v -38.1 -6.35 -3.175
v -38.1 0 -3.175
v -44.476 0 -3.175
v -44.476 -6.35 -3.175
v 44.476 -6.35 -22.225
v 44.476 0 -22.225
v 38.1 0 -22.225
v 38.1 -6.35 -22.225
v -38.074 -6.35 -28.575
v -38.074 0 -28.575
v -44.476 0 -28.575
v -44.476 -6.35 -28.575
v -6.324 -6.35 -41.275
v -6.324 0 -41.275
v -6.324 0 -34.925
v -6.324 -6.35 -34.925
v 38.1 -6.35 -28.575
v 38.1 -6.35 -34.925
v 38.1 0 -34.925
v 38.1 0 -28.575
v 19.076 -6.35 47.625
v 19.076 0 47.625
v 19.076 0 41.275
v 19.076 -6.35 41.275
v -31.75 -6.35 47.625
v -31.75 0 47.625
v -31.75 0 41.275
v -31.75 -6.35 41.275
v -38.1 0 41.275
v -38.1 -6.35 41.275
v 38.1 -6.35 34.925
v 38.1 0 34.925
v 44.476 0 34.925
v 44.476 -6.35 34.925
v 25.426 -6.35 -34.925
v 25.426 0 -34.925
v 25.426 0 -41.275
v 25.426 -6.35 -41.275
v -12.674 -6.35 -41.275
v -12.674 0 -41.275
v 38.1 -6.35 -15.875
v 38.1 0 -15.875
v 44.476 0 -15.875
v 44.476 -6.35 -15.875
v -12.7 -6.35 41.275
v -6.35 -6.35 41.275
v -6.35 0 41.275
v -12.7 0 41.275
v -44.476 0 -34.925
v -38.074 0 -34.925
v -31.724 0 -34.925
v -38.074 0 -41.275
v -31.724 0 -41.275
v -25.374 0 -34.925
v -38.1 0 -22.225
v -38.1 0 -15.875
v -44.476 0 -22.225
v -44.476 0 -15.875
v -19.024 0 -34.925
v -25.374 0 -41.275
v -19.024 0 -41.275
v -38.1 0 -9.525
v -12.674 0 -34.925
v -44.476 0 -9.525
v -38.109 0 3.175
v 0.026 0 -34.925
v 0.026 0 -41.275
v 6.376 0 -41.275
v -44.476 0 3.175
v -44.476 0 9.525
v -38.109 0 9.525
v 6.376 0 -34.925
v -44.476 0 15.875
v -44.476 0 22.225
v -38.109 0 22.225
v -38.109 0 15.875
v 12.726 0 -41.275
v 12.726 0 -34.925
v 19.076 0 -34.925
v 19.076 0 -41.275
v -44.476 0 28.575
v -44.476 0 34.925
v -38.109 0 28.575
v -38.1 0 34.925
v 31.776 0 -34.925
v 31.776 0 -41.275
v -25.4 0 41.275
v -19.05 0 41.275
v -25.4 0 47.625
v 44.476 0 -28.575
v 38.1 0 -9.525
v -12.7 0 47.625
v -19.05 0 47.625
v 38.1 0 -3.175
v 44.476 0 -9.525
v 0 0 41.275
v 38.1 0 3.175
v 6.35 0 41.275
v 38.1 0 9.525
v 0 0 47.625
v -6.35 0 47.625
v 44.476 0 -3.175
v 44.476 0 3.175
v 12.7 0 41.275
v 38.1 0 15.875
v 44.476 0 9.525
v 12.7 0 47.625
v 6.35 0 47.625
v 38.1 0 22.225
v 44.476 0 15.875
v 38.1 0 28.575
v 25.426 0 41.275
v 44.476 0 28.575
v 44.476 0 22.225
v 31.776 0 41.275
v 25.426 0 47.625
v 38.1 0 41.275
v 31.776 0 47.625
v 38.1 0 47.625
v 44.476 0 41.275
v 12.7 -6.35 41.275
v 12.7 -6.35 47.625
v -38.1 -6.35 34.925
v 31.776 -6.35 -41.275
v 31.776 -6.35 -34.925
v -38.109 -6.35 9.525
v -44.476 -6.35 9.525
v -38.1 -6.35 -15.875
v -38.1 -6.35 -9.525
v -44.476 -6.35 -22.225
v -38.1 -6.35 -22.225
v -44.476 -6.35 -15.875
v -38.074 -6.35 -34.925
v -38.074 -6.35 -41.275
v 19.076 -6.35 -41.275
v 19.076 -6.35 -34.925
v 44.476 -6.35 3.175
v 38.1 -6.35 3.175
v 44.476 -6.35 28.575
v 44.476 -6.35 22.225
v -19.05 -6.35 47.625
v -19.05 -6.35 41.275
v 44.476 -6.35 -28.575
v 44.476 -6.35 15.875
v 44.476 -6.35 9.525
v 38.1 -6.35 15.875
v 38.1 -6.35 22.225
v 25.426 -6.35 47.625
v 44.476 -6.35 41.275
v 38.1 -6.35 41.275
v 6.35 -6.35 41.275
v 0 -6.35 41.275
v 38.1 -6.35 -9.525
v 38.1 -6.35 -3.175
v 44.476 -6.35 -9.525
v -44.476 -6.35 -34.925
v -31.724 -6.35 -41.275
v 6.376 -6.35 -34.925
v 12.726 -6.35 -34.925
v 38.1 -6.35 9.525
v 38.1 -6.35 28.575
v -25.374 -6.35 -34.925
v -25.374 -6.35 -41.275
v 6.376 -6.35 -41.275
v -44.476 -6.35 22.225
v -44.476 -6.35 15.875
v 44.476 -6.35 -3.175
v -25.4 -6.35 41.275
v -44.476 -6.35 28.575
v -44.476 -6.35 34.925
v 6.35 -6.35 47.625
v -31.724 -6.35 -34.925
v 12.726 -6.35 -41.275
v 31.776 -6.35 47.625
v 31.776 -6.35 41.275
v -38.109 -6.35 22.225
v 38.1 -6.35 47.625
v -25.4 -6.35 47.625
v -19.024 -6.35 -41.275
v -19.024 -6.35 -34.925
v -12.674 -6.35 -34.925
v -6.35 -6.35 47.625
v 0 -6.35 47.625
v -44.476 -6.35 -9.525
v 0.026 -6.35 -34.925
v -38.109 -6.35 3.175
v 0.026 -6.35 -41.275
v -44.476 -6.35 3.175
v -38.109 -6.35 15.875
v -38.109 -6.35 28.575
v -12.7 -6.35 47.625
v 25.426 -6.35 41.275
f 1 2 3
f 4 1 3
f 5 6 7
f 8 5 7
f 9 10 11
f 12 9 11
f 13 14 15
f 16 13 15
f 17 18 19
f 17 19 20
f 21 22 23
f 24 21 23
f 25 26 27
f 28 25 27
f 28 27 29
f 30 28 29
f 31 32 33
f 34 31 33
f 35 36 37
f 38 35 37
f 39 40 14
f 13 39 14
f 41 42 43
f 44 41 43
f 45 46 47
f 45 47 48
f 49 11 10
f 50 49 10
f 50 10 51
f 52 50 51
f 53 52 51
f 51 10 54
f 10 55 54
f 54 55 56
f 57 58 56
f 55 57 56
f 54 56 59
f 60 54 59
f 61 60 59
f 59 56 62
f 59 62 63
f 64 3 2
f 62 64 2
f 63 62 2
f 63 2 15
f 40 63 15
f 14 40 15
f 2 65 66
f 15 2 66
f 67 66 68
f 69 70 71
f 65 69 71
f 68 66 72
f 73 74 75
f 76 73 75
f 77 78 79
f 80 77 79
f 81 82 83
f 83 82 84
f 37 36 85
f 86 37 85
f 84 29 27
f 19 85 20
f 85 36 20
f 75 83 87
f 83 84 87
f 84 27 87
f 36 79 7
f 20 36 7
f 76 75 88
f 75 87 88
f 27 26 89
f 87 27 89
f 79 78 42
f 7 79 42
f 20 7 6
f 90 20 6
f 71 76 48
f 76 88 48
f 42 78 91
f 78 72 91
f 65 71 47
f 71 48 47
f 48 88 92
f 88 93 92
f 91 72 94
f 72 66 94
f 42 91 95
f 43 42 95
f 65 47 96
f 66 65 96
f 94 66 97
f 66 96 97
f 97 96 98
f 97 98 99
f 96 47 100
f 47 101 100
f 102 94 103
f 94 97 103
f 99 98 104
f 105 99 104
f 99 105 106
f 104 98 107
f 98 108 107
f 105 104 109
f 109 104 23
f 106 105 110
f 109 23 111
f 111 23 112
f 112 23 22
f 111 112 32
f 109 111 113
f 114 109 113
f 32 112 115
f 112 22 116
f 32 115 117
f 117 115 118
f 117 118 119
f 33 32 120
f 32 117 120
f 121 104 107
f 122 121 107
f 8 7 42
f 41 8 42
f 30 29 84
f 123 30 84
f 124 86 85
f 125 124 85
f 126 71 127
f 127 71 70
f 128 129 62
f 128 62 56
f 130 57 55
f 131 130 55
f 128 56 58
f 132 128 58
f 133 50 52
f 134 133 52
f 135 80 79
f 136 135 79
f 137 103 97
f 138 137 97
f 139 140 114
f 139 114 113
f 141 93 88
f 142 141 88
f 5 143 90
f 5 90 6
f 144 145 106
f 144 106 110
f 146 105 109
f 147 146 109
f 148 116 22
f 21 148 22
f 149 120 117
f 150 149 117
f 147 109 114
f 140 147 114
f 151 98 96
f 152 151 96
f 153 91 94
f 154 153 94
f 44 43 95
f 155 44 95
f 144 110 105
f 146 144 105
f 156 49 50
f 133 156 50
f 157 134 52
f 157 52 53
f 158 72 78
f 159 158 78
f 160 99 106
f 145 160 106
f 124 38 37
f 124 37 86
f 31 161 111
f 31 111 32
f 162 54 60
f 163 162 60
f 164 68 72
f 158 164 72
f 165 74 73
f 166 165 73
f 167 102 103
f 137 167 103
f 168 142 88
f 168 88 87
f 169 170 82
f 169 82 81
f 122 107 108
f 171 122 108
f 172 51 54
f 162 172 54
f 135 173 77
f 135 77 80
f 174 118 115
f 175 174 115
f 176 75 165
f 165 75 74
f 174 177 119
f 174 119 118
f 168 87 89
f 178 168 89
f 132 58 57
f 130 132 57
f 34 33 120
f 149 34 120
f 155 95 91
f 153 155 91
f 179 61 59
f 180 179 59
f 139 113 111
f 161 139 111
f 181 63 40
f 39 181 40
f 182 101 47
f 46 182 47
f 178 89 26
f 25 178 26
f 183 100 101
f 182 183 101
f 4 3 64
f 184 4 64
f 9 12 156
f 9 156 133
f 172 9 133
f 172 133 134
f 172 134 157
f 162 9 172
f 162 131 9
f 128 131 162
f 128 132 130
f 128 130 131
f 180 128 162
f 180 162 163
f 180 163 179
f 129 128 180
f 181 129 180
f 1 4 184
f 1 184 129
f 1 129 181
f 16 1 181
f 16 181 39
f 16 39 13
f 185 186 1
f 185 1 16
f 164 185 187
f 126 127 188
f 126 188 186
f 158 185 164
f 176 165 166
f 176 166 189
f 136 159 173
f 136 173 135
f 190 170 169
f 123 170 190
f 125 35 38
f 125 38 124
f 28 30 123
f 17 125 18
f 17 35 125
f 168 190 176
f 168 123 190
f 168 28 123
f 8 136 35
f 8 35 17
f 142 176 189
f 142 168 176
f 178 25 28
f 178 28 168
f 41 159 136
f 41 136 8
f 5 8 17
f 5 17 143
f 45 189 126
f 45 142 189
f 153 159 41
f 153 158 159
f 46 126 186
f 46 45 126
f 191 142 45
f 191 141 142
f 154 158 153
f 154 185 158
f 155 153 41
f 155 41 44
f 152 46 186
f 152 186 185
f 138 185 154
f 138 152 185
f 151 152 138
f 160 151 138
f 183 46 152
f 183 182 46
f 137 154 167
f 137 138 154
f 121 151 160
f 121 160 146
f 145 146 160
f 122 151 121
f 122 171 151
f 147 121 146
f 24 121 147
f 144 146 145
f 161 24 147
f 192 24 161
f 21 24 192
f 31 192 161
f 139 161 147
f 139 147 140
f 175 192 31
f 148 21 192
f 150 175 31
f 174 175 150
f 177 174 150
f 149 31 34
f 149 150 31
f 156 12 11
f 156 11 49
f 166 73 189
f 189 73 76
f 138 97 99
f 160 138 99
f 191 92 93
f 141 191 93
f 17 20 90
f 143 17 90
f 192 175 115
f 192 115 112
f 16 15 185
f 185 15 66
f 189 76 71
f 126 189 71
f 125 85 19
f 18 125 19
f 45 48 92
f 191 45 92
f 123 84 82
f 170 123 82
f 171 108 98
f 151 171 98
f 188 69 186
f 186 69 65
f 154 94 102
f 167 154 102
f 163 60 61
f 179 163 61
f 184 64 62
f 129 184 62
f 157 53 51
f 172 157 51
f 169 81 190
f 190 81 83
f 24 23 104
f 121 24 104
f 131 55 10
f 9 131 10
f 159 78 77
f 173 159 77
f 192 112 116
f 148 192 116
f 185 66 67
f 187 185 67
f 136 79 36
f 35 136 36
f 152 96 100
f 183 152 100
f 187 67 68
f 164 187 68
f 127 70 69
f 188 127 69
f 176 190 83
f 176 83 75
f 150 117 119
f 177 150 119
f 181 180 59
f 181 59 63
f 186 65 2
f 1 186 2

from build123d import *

# Parameters (mm, degrees)
F1_DEPTH = 6.35


with BuildPart() as f1:
    # F0 (on Front) → F1 (new body)
    with BuildSketch(Plane.XZ):
        Polygon((-25.4, 47.625), (-31.75, 47.625), (-31.75, 41.275), (-38.1, 41.275), (-38.1, 34.925), (-44.47566, 34.925), (-44.47566, 28.575), (-38.109287, 28.575), (-38.109287, 22.225), (-44.47566, 22.225), (-44.47566, 15.875), (-38.109287, 15.875), (-38.109287, 9.525), (-44.47566, 9.525), (-44.47566, 3.175), (-38.109287, 3.175), (-38.1, -3.175), (-44.47566, -3.175), (-44.47566, -9.525), (-38.1, -9.525), (-38.1, -15.875), (-44.47566, -15.875), (-44.47566, -22.225), (-38.1, -22.225), (-38.07434, -28.575), (-44.47566, -28.575), (-44.47566, -34.925), (-38.07434, -34.925), (-38.07434, -41.275), (-31.72434, -41.275), (-31.72434, -34.925), (-25.37434, -34.925), (-25.37434, -41.275), (-25.32191, -41.275), (-19.02434, -41.275), (-19.02434, -34.925), (-12.67434, -34.925), (-12.67434, -41.275), (-12.450798, -41.275), (-6.32434, -41.275), (-6.32434, -34.925), (0.02566, -34.925), (0.02566, -41.275), (6.37566, -41.275), (6.37566, -34.925), (12.72566, -34.925), (12.72566, -41.275), (19.07566, -41.275), (19.07566, -34.925), (25.42566, -34.925), (25.42566, -41.275), (31.77566, -41.275), (31.77566, -34.925), (38.1, -34.925), (38.1, -28.575), (44.47566, -28.575), (44.47566, -22.225), (38.1, -22.225), (38.1, -15.875), (44.47566, -15.875), (44.47566, -9.525), (38.1, -9.525), (38.1, -3.175), (44.47566, -3.175), (44.47566, 3.175), (38.1, 3.175), (38.1, 9.525), (44.47566, 9.525), (44.47566, 15.875), (38.1, 15.875), (38.1, 22.225), (44.47566, 22.225), (44.47566, 28.575), (38.1, 28.575), (38.1, 34.925), (44.47566, 34.925), (44.47566, 41.275), (38.1, 41.275), (38.1, 47.625), (31.77566, 47.625), (31.77566, 41.275), (25.42566, 41.275), (25.42566, 47.625), (19.07566, 47.625), (19.07566, 41.275), (12.7, 41.275), (12.7, 47.625), (6.35, 47.625), (6.35, 41.275), (0, 41.275), (0, 47.625), (-6.35, 47.625), (-6.35, 41.275), (-12.7, 41.275), (-12.7, 47.625), (-19.05, 47.625), (-19.05, 41.275), (-25.4, 41.275), align=None)
    extrude(amount=F1_DEPTH)


solid = f1.part
